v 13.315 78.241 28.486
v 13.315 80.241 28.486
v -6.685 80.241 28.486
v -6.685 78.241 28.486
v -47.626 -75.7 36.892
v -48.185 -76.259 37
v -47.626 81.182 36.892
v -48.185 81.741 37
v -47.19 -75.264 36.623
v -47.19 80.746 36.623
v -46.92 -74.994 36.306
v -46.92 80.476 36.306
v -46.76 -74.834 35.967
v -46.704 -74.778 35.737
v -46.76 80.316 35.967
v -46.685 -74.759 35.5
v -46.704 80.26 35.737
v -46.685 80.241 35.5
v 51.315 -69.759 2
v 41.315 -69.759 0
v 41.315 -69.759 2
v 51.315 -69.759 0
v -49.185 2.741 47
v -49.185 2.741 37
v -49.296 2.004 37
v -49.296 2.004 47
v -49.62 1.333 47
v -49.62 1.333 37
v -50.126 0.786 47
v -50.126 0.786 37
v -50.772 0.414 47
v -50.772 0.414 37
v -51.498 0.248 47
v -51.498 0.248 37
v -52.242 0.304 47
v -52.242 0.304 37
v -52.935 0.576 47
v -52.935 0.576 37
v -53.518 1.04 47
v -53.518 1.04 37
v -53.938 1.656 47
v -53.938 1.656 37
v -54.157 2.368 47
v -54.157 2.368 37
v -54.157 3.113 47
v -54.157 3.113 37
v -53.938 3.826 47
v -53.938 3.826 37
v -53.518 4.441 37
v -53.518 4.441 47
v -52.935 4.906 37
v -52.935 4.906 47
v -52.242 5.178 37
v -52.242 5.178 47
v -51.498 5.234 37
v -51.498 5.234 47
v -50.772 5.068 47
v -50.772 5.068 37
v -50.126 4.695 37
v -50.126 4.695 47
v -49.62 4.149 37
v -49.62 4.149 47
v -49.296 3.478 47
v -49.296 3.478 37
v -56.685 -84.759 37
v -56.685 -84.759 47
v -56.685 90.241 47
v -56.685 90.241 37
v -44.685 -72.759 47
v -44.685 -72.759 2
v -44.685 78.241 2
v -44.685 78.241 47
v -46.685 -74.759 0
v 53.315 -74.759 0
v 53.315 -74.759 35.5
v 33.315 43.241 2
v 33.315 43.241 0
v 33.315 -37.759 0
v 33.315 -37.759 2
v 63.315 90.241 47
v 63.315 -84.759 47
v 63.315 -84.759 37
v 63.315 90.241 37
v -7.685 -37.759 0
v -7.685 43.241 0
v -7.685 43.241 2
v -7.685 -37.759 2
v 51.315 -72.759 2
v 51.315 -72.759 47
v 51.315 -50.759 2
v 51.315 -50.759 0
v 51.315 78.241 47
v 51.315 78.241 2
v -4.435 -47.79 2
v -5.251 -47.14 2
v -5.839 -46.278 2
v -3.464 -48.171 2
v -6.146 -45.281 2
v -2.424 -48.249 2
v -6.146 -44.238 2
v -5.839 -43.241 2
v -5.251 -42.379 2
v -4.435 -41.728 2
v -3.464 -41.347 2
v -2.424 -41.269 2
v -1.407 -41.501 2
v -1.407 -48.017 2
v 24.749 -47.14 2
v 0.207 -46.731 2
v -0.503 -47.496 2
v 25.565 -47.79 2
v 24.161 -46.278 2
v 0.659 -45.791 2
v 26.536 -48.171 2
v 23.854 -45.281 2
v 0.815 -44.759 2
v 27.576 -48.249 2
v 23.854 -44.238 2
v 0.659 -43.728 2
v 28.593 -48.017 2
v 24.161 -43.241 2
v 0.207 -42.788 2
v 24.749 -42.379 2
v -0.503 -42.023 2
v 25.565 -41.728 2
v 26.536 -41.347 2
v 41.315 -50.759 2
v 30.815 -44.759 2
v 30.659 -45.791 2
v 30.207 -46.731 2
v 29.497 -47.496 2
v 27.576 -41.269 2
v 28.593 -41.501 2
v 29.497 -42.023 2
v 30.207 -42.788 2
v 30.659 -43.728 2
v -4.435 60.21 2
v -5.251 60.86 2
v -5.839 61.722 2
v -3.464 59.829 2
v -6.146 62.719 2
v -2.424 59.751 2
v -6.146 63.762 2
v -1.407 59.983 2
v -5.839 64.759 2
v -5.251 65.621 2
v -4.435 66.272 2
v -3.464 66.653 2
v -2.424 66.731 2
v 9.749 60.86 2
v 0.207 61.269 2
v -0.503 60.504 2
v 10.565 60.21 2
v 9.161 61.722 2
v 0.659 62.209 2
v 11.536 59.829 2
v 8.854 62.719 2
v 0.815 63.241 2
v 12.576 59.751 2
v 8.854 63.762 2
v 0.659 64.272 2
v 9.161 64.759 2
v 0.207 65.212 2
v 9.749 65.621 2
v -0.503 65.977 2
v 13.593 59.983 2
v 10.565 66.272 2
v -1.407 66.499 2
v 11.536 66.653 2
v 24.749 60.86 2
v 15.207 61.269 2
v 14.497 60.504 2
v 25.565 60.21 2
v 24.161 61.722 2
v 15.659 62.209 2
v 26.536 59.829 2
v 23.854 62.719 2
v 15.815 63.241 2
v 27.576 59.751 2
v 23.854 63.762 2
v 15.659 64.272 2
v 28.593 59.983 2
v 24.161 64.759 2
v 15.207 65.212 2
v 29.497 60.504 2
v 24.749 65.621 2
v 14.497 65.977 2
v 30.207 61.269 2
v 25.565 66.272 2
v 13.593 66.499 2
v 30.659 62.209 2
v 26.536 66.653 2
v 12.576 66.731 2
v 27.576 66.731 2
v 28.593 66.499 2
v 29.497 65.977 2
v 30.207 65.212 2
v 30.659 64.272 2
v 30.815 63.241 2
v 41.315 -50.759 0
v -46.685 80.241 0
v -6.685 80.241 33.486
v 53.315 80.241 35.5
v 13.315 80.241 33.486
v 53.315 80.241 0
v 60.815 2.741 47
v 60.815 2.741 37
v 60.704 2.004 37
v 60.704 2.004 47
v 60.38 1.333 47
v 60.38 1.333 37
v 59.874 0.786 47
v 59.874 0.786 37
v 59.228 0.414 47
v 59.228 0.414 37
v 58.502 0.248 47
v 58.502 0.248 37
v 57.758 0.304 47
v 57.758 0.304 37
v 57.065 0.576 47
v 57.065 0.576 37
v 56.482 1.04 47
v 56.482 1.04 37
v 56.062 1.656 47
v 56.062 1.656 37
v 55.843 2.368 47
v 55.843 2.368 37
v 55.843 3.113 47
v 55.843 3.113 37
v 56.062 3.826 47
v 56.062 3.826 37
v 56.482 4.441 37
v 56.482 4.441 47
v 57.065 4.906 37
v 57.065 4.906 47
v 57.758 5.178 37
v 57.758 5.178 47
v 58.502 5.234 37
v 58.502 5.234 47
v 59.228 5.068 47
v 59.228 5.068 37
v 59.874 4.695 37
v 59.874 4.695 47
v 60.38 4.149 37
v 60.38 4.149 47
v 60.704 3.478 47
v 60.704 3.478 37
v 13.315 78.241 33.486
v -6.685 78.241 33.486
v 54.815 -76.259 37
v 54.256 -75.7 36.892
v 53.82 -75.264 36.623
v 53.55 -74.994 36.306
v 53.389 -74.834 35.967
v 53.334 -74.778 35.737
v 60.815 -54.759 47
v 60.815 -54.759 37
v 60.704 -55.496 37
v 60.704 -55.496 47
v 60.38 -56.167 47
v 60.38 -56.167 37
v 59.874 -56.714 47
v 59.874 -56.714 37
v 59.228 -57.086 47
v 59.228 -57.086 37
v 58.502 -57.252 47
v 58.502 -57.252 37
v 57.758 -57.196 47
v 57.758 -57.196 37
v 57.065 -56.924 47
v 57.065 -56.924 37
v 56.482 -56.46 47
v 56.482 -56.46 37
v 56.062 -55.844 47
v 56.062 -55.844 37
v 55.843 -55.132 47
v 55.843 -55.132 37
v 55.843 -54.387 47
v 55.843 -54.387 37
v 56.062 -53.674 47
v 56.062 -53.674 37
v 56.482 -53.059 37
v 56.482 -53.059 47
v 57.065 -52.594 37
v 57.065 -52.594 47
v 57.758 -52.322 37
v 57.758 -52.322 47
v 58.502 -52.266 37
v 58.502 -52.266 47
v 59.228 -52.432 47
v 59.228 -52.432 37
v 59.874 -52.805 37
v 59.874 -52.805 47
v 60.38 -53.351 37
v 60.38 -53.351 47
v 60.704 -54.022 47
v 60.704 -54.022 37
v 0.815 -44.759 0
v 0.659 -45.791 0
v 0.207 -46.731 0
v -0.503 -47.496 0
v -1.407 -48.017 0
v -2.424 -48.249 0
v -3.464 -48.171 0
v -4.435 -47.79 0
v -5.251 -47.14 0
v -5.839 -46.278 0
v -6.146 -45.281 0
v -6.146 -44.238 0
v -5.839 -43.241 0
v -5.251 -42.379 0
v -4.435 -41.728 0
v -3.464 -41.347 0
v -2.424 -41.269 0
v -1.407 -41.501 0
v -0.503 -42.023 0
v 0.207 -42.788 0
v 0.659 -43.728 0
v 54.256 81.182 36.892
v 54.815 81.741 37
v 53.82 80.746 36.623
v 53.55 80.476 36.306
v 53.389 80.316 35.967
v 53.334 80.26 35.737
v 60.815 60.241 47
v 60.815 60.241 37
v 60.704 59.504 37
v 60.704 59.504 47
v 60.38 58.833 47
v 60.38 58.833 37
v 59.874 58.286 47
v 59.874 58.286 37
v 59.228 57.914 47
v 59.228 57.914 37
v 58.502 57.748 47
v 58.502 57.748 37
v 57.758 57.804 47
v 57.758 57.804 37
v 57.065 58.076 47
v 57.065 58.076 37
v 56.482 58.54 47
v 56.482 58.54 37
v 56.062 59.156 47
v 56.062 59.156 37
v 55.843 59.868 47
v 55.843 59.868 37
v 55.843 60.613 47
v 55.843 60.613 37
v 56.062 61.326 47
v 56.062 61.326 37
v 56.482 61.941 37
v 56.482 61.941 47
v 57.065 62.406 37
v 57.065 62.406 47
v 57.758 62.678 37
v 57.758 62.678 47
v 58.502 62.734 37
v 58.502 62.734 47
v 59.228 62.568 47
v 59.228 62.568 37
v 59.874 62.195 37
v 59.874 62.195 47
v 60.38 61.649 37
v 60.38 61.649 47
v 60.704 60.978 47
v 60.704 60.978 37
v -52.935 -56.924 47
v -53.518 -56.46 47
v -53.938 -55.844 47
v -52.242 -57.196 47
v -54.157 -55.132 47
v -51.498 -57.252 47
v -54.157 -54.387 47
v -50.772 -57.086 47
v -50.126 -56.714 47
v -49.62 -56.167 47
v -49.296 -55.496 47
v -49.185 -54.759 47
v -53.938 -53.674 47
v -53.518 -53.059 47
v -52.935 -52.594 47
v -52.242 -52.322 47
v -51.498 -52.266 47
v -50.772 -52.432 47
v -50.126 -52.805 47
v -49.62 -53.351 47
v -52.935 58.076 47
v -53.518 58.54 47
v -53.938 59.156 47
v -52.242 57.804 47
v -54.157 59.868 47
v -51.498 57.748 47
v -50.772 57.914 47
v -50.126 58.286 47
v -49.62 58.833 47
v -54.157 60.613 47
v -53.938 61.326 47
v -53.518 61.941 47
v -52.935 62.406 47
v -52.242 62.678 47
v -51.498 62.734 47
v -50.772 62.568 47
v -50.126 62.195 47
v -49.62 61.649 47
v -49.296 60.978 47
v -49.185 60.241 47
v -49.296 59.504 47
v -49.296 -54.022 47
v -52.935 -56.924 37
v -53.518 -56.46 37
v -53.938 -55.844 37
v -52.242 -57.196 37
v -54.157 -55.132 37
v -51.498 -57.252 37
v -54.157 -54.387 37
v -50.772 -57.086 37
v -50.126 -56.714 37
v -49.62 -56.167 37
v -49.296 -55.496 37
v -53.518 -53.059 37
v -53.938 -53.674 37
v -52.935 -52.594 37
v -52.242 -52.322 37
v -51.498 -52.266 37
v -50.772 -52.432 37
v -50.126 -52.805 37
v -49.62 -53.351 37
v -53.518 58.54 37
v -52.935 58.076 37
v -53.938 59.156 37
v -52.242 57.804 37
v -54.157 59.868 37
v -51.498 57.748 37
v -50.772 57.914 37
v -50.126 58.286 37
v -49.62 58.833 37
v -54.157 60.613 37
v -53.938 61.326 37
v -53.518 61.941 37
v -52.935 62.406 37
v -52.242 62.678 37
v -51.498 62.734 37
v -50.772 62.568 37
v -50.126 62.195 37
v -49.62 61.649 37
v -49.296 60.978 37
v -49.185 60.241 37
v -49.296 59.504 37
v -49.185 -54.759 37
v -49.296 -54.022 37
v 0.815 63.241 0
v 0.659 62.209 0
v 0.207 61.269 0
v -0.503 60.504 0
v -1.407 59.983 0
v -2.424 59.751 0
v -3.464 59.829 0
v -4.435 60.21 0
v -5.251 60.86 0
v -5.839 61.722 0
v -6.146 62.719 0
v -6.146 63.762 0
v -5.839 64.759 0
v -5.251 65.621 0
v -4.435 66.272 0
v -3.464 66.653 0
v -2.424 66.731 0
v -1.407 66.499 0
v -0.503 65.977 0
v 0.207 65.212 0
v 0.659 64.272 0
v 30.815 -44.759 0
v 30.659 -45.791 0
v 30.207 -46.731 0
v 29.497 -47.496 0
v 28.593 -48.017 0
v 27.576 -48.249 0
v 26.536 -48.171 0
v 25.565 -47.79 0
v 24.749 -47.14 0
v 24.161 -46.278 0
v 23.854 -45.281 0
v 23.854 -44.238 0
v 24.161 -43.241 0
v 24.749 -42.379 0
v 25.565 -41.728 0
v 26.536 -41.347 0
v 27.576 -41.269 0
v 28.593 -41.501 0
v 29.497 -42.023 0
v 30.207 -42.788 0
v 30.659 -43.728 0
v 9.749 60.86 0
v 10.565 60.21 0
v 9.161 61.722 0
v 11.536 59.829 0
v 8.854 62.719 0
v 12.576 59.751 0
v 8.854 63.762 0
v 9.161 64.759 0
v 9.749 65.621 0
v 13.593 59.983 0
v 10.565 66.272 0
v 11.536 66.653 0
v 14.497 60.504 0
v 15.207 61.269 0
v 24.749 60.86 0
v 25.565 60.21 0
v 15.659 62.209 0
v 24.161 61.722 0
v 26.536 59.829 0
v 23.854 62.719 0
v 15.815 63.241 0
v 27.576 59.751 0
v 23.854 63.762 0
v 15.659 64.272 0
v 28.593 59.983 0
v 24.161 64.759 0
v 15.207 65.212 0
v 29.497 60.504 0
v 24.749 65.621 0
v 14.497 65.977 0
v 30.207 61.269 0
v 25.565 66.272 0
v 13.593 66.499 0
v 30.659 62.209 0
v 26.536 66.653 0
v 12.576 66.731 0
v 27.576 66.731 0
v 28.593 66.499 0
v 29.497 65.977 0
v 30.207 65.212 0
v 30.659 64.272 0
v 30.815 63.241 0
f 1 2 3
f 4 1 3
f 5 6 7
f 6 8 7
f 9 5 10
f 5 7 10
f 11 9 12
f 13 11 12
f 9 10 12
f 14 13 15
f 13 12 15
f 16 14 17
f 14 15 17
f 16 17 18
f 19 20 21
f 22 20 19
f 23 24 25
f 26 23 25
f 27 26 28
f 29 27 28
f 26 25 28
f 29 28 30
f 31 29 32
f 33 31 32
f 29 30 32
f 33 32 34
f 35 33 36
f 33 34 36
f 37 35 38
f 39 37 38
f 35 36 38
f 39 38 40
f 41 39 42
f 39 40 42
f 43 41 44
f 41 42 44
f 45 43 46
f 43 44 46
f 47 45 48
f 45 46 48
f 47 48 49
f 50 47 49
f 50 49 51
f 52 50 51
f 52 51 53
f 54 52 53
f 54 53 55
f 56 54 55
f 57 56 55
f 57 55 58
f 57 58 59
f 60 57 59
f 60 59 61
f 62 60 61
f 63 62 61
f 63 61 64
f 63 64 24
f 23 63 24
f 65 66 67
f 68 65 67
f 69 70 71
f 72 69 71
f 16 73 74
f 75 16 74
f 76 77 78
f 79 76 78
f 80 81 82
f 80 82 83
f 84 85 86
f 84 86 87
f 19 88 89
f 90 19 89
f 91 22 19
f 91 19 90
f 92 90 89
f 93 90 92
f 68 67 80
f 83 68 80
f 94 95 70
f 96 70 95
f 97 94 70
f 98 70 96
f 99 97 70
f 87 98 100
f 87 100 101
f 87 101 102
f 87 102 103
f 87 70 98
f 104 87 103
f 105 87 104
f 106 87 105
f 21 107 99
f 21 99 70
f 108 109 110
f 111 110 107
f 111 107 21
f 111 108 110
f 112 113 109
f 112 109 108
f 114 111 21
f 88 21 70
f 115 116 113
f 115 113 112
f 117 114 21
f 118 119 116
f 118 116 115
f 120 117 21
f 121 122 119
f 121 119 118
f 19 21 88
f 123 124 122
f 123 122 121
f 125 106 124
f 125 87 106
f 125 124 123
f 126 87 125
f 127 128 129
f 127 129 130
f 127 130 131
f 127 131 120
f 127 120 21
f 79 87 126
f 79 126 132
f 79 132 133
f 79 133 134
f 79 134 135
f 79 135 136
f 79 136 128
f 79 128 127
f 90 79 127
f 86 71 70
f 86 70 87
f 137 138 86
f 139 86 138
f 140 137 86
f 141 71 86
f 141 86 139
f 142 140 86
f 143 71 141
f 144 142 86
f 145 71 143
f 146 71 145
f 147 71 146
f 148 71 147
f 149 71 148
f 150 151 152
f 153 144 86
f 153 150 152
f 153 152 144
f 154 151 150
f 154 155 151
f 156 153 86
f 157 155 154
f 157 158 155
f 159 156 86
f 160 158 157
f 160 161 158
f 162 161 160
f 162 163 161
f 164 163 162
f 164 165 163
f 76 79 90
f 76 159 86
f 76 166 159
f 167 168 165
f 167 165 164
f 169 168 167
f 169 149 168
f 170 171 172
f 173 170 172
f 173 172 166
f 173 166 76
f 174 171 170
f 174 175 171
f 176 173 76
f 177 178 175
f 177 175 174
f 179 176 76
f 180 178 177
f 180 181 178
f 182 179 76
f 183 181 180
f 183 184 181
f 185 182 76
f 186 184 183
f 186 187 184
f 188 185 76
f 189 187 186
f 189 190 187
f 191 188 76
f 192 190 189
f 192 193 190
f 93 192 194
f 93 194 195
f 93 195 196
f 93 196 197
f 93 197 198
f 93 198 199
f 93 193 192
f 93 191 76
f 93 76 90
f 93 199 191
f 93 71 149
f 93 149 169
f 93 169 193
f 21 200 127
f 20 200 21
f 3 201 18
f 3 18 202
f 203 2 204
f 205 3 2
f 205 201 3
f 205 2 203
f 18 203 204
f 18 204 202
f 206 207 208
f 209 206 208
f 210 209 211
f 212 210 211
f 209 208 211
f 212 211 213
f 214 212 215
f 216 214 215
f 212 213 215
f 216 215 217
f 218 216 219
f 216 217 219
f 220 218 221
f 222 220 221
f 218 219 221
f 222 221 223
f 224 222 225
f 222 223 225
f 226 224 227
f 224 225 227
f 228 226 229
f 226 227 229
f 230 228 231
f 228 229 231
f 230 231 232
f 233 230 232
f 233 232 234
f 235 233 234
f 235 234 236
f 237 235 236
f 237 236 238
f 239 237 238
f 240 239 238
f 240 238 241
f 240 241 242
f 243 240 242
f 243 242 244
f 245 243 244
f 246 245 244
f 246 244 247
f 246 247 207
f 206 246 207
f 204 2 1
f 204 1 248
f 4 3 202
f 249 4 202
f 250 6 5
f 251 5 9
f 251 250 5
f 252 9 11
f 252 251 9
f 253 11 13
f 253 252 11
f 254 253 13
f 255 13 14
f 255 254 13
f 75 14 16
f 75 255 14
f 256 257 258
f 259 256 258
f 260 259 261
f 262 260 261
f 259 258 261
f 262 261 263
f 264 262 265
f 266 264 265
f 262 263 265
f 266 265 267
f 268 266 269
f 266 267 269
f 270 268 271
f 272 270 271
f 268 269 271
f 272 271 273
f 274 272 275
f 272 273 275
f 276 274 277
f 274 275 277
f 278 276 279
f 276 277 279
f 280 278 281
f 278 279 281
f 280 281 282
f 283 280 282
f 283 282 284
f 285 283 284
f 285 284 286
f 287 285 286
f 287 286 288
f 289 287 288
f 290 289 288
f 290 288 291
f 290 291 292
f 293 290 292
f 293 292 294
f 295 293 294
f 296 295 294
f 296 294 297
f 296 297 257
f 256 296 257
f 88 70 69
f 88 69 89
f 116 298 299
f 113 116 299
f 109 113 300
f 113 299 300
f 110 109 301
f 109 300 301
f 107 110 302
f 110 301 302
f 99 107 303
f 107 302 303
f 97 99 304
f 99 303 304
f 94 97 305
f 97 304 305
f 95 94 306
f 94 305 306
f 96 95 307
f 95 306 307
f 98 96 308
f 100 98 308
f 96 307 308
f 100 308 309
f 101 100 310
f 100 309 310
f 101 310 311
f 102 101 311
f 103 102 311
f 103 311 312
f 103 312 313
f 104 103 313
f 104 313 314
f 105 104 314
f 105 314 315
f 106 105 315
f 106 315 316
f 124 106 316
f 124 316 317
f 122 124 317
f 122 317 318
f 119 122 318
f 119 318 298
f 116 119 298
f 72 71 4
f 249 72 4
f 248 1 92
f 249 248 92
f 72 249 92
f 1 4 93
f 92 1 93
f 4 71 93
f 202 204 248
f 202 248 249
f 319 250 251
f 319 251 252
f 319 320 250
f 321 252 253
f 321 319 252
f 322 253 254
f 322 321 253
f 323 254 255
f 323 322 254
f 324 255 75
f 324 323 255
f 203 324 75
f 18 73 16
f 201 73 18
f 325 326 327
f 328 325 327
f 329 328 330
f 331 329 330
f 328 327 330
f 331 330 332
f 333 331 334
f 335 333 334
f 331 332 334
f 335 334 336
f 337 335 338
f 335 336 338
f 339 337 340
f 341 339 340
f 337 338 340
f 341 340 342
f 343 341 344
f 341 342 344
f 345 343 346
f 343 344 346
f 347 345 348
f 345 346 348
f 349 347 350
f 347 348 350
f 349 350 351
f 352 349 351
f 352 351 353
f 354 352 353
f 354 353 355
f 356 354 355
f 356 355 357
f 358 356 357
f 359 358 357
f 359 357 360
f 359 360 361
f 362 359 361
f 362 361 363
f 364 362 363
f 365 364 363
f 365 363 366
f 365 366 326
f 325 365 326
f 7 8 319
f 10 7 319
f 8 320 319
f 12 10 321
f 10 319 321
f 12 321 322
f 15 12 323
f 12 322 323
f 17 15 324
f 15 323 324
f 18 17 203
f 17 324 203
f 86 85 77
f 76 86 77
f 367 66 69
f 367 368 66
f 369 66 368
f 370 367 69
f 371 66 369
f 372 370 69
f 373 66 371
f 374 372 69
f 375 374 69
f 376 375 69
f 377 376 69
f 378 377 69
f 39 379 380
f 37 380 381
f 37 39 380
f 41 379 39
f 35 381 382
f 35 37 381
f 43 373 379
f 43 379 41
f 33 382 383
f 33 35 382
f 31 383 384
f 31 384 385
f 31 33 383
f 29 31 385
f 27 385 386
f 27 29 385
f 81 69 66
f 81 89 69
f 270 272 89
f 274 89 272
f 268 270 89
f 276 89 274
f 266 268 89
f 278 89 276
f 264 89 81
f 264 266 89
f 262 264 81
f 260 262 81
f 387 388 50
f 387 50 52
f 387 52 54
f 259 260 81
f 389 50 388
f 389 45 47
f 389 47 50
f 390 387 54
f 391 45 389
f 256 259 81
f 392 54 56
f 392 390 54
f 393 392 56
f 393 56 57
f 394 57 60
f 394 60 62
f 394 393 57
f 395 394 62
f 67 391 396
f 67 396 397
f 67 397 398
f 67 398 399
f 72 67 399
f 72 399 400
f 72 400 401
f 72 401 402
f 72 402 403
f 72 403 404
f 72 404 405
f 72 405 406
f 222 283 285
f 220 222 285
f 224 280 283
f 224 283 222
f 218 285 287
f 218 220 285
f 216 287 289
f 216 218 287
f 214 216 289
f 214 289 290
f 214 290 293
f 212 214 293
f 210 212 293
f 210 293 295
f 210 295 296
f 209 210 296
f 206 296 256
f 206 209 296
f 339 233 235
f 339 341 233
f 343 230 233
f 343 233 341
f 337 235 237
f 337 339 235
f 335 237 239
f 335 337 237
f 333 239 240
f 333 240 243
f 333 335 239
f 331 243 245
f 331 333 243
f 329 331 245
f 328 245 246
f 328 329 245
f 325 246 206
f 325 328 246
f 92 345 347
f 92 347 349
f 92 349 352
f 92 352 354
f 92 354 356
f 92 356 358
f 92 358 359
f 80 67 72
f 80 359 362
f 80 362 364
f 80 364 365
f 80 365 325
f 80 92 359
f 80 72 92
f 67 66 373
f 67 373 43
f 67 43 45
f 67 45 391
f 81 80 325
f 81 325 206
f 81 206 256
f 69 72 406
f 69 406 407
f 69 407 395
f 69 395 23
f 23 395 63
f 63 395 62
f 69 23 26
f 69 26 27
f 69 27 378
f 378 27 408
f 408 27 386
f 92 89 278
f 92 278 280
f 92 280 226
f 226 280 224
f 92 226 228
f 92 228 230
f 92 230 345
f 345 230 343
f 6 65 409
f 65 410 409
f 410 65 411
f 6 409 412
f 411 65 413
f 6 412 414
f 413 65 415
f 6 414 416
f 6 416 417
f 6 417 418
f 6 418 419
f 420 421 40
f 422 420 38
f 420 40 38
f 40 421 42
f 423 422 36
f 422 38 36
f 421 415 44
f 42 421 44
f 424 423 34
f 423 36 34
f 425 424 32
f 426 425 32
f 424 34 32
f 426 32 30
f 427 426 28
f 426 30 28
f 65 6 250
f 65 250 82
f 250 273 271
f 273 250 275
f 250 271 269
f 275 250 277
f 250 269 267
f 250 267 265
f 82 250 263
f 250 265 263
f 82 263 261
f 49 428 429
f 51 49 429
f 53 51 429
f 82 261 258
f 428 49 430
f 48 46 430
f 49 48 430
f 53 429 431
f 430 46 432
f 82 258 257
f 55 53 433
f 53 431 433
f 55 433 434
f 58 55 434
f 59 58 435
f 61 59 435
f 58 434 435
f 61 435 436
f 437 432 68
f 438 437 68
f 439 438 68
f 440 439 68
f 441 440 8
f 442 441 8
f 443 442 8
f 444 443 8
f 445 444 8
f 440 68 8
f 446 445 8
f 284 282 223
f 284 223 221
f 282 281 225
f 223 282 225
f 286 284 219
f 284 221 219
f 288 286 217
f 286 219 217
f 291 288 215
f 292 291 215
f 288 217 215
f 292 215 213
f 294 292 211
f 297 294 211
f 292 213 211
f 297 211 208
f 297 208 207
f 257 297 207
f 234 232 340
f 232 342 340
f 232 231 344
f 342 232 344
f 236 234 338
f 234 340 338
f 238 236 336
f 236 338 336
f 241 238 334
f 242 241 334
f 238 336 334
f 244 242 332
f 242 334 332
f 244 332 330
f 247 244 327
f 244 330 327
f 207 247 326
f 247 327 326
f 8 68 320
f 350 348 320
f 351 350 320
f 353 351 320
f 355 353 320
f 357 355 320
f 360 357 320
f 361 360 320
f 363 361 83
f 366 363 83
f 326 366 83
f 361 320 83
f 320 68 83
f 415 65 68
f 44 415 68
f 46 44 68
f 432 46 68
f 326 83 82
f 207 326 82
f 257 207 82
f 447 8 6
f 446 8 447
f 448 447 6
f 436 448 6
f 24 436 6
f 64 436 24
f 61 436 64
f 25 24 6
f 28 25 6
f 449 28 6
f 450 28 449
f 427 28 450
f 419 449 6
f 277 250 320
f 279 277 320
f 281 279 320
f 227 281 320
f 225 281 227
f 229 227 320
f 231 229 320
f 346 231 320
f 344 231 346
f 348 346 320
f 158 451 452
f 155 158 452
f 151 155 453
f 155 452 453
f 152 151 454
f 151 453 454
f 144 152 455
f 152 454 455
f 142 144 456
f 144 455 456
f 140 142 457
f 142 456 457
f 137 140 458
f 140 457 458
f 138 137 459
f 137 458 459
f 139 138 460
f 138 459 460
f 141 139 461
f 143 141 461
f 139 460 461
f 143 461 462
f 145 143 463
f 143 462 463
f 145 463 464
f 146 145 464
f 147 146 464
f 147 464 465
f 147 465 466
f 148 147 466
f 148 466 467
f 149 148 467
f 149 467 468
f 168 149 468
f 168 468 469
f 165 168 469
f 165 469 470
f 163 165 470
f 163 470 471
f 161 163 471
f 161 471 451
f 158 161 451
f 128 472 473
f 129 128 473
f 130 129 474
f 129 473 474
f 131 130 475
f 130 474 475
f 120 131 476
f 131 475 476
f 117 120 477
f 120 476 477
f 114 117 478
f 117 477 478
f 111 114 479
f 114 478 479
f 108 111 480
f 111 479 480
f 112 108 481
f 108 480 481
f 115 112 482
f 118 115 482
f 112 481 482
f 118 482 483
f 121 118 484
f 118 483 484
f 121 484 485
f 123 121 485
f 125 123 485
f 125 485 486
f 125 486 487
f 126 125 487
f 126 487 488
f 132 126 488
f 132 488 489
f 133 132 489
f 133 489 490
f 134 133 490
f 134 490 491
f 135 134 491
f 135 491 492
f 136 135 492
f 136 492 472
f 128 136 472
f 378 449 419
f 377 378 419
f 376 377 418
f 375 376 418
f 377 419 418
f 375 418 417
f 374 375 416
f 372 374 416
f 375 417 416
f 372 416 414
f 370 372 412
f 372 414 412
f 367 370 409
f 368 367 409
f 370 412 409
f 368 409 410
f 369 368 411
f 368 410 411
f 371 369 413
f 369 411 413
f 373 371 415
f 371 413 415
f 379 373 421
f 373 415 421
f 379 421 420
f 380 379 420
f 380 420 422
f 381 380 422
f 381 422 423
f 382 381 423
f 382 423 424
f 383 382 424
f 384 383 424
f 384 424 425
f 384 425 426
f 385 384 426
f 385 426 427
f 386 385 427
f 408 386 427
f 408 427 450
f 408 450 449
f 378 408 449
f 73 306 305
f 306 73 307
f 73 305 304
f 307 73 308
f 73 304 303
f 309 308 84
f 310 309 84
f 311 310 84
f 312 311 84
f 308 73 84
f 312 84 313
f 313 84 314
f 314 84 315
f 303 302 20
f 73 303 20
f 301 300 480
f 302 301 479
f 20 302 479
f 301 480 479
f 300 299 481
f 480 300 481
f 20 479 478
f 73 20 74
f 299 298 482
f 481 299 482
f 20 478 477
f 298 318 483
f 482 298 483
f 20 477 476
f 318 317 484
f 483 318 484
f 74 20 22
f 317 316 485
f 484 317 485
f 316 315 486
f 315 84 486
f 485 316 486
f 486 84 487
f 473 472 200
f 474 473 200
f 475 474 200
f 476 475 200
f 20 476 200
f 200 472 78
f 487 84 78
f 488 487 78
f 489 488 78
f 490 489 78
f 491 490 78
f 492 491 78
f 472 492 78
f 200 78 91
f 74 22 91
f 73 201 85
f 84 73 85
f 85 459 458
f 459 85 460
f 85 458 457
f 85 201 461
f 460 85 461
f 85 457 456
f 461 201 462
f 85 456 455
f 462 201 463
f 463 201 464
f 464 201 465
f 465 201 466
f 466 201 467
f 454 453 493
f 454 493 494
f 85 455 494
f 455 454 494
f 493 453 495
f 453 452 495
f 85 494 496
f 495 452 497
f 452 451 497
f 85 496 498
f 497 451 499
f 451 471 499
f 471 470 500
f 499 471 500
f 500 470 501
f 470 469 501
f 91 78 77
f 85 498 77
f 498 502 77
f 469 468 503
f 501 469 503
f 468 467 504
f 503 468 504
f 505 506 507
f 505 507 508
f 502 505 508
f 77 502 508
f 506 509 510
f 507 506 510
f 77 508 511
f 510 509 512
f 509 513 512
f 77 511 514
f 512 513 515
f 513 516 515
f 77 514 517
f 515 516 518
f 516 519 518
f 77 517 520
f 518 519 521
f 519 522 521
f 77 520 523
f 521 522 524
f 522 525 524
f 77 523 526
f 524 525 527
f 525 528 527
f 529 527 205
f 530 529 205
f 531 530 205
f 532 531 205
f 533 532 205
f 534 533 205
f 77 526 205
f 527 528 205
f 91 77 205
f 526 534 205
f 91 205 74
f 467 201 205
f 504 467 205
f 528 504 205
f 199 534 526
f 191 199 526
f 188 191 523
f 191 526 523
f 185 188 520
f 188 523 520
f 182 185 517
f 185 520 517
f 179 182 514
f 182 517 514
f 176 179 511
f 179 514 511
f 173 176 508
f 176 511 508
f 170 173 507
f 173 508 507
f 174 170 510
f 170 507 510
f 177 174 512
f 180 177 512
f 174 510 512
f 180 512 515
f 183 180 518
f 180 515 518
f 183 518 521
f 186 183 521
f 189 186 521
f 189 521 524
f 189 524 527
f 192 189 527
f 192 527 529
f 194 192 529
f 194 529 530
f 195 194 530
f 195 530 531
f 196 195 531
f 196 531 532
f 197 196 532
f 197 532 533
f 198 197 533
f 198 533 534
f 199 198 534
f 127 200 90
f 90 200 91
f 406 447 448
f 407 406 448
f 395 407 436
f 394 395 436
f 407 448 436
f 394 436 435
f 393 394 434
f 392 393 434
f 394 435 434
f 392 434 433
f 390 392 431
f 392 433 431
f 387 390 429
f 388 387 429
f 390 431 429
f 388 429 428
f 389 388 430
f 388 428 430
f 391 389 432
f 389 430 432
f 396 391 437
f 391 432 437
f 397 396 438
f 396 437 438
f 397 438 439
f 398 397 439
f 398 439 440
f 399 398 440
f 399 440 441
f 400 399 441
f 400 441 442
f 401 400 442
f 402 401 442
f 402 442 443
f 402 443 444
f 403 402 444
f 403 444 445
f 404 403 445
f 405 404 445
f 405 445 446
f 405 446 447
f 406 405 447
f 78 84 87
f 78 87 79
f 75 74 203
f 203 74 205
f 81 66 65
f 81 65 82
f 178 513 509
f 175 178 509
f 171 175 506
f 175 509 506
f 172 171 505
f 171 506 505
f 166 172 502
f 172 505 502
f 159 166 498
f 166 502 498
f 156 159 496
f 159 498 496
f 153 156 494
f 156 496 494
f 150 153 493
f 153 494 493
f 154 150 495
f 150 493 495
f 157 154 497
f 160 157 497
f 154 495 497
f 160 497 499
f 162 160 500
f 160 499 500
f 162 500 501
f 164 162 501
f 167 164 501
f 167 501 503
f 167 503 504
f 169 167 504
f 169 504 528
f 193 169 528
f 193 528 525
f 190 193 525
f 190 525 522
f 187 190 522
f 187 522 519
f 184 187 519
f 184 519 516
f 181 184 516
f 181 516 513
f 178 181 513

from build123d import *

# Parameters (mm, degrees)
F0_W      = 100
F0_H      = 155
F1_DEPTH  = 2
F2_W      = 100
F2_H      = 155
F2_W_2    = 96
F2_H_2    = 151
F3_DEPTH  = 45
F4_W      = 41
F4_H      = 81
F5_DEPTH  = 25
F6_R      = 3.5
F7_DEPTH  = 25
F8_W      = 10
F8_H      = 19
F9_DEPTH  = 25
F10_W     = 120
F10_H     = 175
F10_W_2   = 96
F10_H_2   = 151
F11_DEPTH = 10
F12_R     = 2.5
F13_DEPTH = 25
F14_W     = 20
F14_H     = 5
F15_DEPTH = 25
F16_R     = 1.5


with BuildPart() as f1:
    # F0 (on Top) → F1 (new body)
    with BuildSketch(Plane.XY):
        with Locations((3.314801, 2.740827)):
            Rectangle(F0_W, F0_H)
    extrude(amount=F1_DEPTH)

    # F2 (on face) → F3 (join)
    with BuildSketch(Plane.XY.offset(2)):
        with Locations((3.314801, 2.740827)):
            Rectangle(F2_W, F2_H)
        with Locations((3.314801, 2.740827)):
            Rectangle(F2_W_2, F2_H_2, mode=Mode.SUBTRACT)
    extrude(amount=F3_DEPTH)

    # F4 (on face) → F5 (cut)
    with BuildSketch(Plane(origin=(0, 0, 0), x_dir=(1, 0, 0), z_dir=(0, 0, -1))):
        with Locations((12.814801, -2.740827)):
            Rectangle(F4_W, F4_H)
    extrude(amount=-F5_DEPTH, mode=Mode.SUBTRACT)

    # F6 (on face) → F7 (cut)
    with BuildSketch(Plane(origin=(0, 0, 0), x_dir=(1, 0, 0), z_dir=(0, 0, -1))):
        with Locations((-2.685199, 44.759173)):
            Circle(F6_R)
        with Locations((27.314801, 44.759173)):
            Circle(F6_R)
        with Locations((27.314801, -63.240827)):
            Circle(F6_R)
        with Locations((12.314801, -63.240827)):
            Circle(F6_R)
        with Locations((-2.685199, -63.240827)):
            Circle(F6_R)
    extrude(amount=-F7_DEPTH, mode=Mode.SUBTRACT)

    # F8 (on face) → F9 (cut)
    with BuildSketch(Plane(origin=(0, 0, 0), x_dir=(1, 0, 0), z_dir=(0, 0, -1))):
        with Locations((46.314801, 60.259173)):
            Rectangle(F8_W, F8_H)
    extrude(amount=-F9_DEPTH, mode=Mode.SUBTRACT)

    # F10 (on face) → F11 (join)
    with BuildSketch(Plane.XY.offset(47)):
        with Locations((3.314801, 2.740827)):
            Rectangle(F10_W, F10_H)
        with Locations((3.314801, 2.740827)):
            Rectangle(F10_W_2, F10_H_2, mode=Mode.SUBTRACT)
    extrude(amount=-F11_DEPTH)

    # F12 (on face) → F13 (cut)
    with BuildSketch(Plane(origin=(0, 0, 37), x_dir=(1, 0, 0), z_dir=(0, 0, -1))):
        with Locations((-51.685199, -60.240827)):
            Circle(F12_R)
        with Locations((-51.685199, -2.740827)):
            Circle(F12_R)
        with Locations((-51.685199, 54.759173)):
            Circle(F12_R)
        with Locations((58.314801, 54.759173)):
            Circle(F12_R)
        with Locations((58.314801, -2.740827)):
            Circle(F12_R)
        with Locations((58.314801, -60.240827)):
            Circle(F12_R)
    extrude(amount=-F13_DEPTH, mode=Mode.SUBTRACT)

    # F14 (on face) → F15 (cut)
    with BuildSketch(Plane(origin=(0, 80.240827, 0), x_dir=(-1, 0, 0), z_dir=(0, 1, 0))):
        with Locations((-3.314801, 30.98563)):
            Rectangle(F14_W, F14_H)
    extrude(amount=-F15_DEPTH, mode=Mode.SUBTRACT)

    # F16
    f16_edges = [f1.edges().sort_by_distance(p)[0] for p in [
        (-46.685199, 2.740827, 37),
        (3.314801, 80.240827, 37),
        (3.314801, -74.759173, 37),
        (53.314801, 2.740827, 37),
    ]]
    fillet(f16_edges, radius=F16_R)


solid = f1.part
